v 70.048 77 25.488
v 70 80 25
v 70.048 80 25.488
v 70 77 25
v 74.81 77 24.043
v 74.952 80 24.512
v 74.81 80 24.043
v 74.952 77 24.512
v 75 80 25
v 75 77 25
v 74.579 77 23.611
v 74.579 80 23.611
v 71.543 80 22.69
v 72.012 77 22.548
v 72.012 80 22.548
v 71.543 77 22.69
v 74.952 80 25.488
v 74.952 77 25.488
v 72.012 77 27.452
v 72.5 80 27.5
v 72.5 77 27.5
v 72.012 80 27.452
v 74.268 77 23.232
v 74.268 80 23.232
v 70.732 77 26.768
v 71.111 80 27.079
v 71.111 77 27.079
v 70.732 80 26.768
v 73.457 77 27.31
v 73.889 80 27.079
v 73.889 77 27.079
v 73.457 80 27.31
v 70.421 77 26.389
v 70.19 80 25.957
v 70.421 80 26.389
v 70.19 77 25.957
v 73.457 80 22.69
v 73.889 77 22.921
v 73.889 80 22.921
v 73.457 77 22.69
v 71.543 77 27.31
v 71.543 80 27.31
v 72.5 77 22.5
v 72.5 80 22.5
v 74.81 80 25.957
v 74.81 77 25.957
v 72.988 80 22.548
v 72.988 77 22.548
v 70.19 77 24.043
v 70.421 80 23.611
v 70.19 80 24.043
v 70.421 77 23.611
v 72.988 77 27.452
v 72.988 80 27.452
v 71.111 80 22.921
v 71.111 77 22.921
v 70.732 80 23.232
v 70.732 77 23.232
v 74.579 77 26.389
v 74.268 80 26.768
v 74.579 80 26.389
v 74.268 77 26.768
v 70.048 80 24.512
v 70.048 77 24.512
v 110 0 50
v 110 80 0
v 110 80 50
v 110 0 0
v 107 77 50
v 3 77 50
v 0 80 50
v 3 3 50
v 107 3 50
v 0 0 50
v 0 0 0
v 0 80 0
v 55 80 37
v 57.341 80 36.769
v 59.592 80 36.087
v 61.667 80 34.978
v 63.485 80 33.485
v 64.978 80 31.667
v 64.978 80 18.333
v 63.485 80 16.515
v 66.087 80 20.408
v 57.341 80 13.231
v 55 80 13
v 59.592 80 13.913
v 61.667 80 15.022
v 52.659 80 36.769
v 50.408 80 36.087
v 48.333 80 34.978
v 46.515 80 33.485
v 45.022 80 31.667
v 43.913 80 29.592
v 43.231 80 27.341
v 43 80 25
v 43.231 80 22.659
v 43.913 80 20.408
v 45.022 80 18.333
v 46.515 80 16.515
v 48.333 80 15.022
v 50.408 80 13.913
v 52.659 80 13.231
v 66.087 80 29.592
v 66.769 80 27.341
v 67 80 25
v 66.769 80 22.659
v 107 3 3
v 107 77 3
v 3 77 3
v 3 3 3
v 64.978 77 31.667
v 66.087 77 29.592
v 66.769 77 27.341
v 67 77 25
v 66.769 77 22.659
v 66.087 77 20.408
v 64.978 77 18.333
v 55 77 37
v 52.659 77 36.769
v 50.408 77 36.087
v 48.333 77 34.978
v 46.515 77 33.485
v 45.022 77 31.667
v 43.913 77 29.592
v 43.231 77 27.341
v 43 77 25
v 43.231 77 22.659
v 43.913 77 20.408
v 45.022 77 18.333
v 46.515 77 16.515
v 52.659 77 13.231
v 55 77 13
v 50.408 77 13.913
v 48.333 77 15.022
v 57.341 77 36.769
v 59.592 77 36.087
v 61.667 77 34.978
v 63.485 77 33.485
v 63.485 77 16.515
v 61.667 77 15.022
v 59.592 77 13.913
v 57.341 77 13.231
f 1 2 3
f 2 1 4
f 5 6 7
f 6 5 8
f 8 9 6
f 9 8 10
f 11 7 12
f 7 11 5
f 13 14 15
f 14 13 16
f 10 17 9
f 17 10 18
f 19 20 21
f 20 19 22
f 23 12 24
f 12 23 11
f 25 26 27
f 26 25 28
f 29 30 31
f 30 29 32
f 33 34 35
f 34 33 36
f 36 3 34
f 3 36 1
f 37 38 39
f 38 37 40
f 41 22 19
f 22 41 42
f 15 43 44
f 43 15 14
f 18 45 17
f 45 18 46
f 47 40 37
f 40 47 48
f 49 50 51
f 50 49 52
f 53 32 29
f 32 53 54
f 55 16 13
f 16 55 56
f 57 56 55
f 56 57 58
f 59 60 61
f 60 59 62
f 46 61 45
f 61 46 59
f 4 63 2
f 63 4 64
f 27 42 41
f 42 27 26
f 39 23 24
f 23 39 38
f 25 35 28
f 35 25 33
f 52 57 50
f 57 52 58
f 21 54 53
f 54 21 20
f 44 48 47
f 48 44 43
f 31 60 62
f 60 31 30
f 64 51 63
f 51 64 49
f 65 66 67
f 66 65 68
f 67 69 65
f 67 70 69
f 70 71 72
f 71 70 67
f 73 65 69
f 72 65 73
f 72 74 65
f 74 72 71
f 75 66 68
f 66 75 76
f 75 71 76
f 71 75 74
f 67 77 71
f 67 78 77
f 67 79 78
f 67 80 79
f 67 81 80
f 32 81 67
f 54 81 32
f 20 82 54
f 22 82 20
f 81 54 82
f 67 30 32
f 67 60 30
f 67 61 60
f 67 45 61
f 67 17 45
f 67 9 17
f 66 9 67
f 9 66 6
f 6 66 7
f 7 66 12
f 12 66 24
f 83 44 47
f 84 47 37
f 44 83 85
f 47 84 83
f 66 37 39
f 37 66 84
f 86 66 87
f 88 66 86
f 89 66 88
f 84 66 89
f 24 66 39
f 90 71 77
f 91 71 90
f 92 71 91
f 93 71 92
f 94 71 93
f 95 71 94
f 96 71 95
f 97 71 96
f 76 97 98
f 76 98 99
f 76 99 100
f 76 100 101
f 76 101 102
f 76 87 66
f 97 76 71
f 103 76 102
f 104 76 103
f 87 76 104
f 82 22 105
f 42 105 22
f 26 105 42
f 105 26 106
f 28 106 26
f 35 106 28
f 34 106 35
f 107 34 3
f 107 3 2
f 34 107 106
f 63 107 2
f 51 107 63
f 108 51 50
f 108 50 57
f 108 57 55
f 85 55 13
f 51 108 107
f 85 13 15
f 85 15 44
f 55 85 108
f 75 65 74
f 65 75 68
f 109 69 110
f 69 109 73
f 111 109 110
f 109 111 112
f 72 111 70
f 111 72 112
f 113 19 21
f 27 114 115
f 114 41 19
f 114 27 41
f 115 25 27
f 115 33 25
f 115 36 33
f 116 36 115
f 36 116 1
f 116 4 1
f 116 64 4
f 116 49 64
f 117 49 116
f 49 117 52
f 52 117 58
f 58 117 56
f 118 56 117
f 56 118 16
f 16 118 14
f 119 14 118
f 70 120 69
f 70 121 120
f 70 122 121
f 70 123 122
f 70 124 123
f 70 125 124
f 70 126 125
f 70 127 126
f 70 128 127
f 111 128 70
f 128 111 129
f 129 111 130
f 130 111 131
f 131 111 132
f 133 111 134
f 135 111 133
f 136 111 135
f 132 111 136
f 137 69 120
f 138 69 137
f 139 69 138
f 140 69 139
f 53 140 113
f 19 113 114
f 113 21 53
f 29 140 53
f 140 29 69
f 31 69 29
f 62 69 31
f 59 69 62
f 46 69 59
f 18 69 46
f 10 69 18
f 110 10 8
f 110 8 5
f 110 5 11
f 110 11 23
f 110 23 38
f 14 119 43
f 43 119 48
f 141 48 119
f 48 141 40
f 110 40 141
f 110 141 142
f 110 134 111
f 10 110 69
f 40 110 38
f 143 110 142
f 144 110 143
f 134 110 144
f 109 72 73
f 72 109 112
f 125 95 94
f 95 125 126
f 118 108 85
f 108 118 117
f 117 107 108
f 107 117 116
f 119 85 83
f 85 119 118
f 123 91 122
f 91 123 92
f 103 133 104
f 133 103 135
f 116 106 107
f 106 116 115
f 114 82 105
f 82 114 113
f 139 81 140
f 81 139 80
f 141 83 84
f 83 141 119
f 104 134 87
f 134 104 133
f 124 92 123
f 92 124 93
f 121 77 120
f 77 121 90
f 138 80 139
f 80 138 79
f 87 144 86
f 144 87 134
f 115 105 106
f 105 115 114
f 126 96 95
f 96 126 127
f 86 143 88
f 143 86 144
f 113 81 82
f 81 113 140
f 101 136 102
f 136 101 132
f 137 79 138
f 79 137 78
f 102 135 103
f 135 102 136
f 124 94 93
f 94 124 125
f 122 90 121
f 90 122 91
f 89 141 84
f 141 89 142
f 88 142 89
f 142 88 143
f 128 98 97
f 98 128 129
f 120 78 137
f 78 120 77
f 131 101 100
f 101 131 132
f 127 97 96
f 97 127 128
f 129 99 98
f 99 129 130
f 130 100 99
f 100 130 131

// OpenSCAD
$fn = 32;

// ----------------------------------------------------------------------
// Vent box: roundvent enclosure
// ----------------------------------------------------------------------

// --- parameters (mm) ---
box_l = 110;              // box length, X
box_w = 80;               // box width, Y
box_h = 50;               // box height, Z
wall_t = 3;               // shell wall thickness
vent_d = 24;              // central vent diameter
ring_d = 5;               // ring hole diameter
n_ring = 6;               // holes in the ring
ring_r = 17.5;            // ring radius

ring_step = 360 / n_ring;  // ring hole angular step

difference() {
  cube([box_l, box_w, box_h]);
  translate([wall_t, wall_t, wall_t])
    cube([box_l - 2 * wall_t, box_w - 2 * wall_t, box_h]);
  translate([box_l / 2, box_w - wall_t - 1, box_h / 2])
    rotate([-90, 0, 0]) cylinder(h = wall_t + 2, d = vent_d);
  for (i = [0 : n_ring - 1])
    translate([box_l / 2, box_w - wall_t - 1, box_h / 2])
      rotate([0, 0, i * ring_step])
        translate([ring_r, 0, 0]) rotate([-90, 0, 0])
          cylinder(h = wall_t + 2, d = ring_d);
}
